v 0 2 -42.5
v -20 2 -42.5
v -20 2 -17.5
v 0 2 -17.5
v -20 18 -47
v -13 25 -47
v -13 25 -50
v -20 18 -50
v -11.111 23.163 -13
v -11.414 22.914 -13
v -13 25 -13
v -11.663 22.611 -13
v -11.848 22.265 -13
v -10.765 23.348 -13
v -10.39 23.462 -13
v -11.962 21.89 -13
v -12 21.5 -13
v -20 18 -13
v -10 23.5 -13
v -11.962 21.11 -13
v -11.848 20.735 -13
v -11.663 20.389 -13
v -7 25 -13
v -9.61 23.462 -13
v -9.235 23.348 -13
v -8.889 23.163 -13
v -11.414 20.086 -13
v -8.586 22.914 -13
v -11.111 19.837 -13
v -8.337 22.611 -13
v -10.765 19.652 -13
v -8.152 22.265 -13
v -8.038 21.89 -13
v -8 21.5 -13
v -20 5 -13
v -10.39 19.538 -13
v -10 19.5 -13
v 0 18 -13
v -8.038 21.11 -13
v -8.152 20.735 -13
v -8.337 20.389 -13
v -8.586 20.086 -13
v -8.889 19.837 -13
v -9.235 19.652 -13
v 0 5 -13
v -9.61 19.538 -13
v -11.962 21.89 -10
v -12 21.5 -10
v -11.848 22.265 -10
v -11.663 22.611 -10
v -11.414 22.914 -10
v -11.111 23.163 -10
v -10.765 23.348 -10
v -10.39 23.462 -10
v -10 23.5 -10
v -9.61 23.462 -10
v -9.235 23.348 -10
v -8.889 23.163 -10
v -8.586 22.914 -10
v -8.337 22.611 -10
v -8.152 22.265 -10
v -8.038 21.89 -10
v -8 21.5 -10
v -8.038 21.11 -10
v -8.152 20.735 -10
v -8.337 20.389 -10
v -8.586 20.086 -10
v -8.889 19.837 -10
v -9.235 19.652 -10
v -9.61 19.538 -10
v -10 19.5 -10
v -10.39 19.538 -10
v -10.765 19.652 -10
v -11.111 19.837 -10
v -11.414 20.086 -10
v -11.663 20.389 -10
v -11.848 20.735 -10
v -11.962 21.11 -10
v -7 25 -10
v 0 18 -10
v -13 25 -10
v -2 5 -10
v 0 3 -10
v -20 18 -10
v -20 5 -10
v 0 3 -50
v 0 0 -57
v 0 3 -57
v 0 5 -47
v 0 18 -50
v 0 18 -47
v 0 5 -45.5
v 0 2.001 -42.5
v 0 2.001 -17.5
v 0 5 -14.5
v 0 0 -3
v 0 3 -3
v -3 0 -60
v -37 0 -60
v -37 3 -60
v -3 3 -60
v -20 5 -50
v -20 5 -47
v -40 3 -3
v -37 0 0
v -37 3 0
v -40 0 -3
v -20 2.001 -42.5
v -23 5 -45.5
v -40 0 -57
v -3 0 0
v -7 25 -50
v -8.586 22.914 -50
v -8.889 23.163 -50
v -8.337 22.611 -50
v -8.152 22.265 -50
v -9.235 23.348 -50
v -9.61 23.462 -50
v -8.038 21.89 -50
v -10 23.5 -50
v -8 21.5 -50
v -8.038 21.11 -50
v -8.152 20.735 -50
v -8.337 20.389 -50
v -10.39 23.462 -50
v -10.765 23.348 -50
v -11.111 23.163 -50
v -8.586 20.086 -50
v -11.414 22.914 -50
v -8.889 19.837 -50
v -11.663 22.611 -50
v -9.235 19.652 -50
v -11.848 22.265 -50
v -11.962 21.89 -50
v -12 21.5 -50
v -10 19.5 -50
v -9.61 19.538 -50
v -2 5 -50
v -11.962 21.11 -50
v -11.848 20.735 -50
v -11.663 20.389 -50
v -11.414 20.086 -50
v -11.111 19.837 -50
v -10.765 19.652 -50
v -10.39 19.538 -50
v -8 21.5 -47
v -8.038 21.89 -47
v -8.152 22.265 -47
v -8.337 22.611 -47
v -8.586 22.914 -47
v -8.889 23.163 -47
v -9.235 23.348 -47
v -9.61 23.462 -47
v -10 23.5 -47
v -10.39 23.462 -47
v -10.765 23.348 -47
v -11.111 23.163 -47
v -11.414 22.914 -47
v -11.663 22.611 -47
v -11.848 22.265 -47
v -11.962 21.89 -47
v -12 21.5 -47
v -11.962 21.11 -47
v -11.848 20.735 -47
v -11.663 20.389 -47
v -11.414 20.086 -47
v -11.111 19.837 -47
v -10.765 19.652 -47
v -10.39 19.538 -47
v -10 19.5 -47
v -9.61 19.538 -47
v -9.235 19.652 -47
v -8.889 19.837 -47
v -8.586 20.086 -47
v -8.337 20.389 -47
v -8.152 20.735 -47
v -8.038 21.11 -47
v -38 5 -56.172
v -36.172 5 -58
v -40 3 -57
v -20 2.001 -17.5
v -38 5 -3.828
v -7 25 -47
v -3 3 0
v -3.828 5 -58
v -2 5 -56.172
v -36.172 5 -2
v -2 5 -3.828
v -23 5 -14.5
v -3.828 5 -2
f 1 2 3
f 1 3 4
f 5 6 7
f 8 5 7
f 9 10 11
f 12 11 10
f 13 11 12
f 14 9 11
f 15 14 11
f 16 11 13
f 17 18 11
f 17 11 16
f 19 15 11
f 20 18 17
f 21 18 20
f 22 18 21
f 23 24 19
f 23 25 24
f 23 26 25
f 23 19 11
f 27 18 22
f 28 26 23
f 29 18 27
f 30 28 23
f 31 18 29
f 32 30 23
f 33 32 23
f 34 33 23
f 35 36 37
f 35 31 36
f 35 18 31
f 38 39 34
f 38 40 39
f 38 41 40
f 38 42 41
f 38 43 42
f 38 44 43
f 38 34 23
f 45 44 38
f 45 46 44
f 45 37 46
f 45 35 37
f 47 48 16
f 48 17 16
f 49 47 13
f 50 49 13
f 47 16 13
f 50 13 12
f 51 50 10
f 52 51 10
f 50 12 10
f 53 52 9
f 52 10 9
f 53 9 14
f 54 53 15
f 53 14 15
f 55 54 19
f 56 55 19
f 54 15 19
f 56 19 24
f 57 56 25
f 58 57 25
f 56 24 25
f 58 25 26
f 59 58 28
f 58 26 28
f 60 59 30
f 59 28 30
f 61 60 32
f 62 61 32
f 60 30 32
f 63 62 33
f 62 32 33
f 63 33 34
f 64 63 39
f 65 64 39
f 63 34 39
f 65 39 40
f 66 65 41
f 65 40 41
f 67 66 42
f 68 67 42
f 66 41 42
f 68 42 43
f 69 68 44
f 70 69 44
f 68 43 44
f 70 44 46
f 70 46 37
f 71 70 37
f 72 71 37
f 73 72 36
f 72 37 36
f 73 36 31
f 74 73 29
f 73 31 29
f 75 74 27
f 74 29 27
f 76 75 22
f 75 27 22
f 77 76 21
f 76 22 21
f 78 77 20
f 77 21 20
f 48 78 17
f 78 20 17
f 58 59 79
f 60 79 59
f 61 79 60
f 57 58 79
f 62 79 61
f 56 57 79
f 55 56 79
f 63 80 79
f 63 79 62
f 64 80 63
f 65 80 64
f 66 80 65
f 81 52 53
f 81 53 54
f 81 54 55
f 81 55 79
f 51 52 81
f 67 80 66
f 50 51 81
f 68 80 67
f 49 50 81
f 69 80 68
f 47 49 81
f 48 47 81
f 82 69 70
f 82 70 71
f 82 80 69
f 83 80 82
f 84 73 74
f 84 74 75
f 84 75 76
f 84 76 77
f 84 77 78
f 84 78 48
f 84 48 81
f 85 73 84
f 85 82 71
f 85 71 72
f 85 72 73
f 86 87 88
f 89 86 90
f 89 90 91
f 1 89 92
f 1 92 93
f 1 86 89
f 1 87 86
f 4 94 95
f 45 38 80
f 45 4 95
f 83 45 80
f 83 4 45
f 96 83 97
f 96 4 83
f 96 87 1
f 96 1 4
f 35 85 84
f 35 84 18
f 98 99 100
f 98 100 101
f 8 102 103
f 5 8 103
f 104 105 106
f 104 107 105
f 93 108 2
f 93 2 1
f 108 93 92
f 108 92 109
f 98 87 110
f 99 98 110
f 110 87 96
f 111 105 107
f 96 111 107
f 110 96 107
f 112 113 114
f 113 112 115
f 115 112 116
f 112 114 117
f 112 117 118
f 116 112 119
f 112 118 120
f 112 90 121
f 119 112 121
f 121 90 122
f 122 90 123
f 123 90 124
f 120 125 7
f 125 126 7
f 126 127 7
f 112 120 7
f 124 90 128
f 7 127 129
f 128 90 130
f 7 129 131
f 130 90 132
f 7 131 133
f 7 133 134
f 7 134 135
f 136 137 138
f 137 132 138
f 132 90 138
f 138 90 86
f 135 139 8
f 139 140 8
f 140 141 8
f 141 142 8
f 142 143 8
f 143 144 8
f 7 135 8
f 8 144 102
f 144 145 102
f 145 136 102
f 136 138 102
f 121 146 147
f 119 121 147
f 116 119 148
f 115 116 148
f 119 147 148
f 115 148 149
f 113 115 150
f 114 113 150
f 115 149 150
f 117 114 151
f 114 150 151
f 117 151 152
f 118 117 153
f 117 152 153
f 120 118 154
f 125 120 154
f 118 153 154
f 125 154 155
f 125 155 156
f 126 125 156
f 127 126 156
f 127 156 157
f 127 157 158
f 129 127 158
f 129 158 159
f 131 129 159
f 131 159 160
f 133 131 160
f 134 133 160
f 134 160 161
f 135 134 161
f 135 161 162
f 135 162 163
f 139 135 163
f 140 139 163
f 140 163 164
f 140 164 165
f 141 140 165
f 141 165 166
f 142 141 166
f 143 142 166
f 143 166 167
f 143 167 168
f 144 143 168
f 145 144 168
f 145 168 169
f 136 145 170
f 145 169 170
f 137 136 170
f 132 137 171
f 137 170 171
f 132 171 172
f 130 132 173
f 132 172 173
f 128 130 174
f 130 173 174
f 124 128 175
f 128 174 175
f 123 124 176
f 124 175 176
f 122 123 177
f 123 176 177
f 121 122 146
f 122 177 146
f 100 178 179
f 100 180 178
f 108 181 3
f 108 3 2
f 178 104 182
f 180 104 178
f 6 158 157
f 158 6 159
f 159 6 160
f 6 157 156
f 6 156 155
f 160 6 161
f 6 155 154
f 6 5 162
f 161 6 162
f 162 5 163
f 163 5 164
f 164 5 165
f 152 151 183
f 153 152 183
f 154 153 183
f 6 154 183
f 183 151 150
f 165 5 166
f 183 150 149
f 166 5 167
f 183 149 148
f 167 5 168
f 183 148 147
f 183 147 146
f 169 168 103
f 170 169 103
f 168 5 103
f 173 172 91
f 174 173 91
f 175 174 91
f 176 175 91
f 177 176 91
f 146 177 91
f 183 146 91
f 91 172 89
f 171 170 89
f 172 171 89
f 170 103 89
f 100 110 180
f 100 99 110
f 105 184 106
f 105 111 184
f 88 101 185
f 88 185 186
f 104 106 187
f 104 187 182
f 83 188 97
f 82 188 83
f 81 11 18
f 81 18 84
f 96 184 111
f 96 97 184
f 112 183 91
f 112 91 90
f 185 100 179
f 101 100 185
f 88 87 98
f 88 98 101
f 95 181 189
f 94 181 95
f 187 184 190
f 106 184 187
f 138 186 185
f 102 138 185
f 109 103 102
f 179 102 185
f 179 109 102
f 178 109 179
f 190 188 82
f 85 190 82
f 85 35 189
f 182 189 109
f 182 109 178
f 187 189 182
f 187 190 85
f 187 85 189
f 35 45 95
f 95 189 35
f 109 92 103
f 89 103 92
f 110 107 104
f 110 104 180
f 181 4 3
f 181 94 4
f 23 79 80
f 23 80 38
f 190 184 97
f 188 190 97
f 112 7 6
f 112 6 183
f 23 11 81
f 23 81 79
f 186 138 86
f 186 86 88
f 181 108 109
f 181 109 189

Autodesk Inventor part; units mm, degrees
ref_plane "YZ Plane" through (0, 0, 0) normal (1, 0, 0) x (0, 1, 0)
ref_plane "XZ Plane" through (0, 0, 0) normal (0, 1, 0) x (-1, 0, 0)
ref_plane "XY Plane" through (0, 0, 0) normal (0, 0, 1) x (1, 0, 0)
sketch "Esboço1" plane through (0, 0, 0) normal (0, 1, 0) x (-1, 0, 0)
  line L0 (0, 0) -> (40, 0)
  line L1 (40, 0) -> (40, -60)
  line L2 (40, -60) -> (0, -60)
  line L3 (0, -60) -> (0, 0)
  dimension "d0" = 40
  dimension "d1" = 60
extrude "Extrusão1" add sketch "Esboço1" along normal blind 5
chamfer "Chanfro1" distance 3 angle 45 4 edges at (0, 2.5, 0) (-40, 2.5, 0) (0, 2.5, -60) (-40, 2.5, -60)
sketch "Esboço2" plane through (0, 5, 0) normal (0, 1, 0) x (1, 0, 0)
  line L0 (-3, 60) -> (-37, 60) construction
  line L1 (-20, 60) -> (-20, 0) construction
  line L2 (-20, 30) -> (0, 30) construction
  line L3 (-3, 30) -> (-3, 50) construction
  line L4 (-3, 30) -> (-3, 10) construction
  line L5 (0, 3) -> (0, 57) projected
  line L6 (0, 10) -> (-20, 10)
  line L7 (-20, 10) -> (-20, 13)
  line L8 (-20, 13) -> (0, 13)
  line L9 (0, 13) -> (0, 10)
  line L10 (0, 50) -> (-20, 50)
  line L11 (-20, 50) -> (-20, 47)
  line L12 (-20, 47) -> (0, 47)
  line L13 (0, 47) -> (0, 50)
  point P0 (0, 0)
  dimension "d7" = 20
  dimension "d8" = 20
  dimension "d9" = 3
  dimension "d10" = 3
extrude "Extrusão2" add sketch "Esboço2" along normal blind 20
chamfer "Chanfro2" distance 7 angle 45 4 edges at (-20, 25, -11.5) (0, 25, -11.5) (0, 25, -48.5) (-20, 25, -48.5)
sketch "Esboço3" plane through (0, 5, -13) normal (0, 0, -1) x (-1, 0, 0)
  line L0 (0, 13) -> (20, 13) construction
  line L1 (0, 13) -> (20, 13) construction
  line L2 (10, 13) -> (10, 20) construction
  line L3 (13, 20) -> (7, 20) construction
  circle A0 centre (10, 16.5) radius 2
  point P0 (0, -5)
  dimension "d16" = 4
extrude "Extrusão3" cut sketch "Esboço3" against normal blind 20
sketch "Esboço4" plane through (-20, 5, -47) normal (0, 0, 1) x (1, 0, 0)
  line L0 (0, 0) -> (0, 13) construction
  line L1 (20, 0) -> (20, 13) construction
  line L2 (0, 13) -> (20, 13) construction
  line L3 (20, 13) -> (10, 13) construction
  line L4 (10, 13) -> (10, 20) construction
  line L5 (13, 20) -> (7, 20) construction
  circle A0 centre (10, 16.5) radius 2
  point P0 (20, -5)
  dimension "d19" = 4
extrude "Extrusão4" cut sketch "Esboço4" against normal blind 666
chamfer "Chanfro3" distance 2 angle 45 9 edges at (-20, 5, -60) (-38.5, 5, -58.5) (-40, 5, -30) (-38.5, 5, -1.5) (-20, 5, 0) (-1.5, 5, -1.5) (0, 5, -6.5) (0, 5, -53.5) (-1.5, 5, -58.5)
sketch "Esboço5" plane through (0, 5, 0) normal (0, 1, 0) x (1, 0, 0)
  line L0 (0, 57) -> (0, 3) projected
  line L1 (0, 17.5) -> (-20, 17.5)
  line L2 (-20, 17.5) -> (-20, 42.5)
  line L3 (-20, 42.5) -> (0, 42.5)
  line L4 (0, 42.5) -> (0, 17.5)
  line L5 (-7, 13) -> (-13, 13) projected
  point P0 (0, 0)
  dimension "d25" = 20
  dimension "d26" = 25
  dimension "d27" = 4.5
extrude "Extrusão5" cut sketch "Esboço5" against normal blind 3
chamfer "Chanfro4" distance 3 angle 45 3 edges at (-20, 5, -30) (-10, 5, -42.5) (-10, 5, -17.5)
properties part number "Pezotta"
